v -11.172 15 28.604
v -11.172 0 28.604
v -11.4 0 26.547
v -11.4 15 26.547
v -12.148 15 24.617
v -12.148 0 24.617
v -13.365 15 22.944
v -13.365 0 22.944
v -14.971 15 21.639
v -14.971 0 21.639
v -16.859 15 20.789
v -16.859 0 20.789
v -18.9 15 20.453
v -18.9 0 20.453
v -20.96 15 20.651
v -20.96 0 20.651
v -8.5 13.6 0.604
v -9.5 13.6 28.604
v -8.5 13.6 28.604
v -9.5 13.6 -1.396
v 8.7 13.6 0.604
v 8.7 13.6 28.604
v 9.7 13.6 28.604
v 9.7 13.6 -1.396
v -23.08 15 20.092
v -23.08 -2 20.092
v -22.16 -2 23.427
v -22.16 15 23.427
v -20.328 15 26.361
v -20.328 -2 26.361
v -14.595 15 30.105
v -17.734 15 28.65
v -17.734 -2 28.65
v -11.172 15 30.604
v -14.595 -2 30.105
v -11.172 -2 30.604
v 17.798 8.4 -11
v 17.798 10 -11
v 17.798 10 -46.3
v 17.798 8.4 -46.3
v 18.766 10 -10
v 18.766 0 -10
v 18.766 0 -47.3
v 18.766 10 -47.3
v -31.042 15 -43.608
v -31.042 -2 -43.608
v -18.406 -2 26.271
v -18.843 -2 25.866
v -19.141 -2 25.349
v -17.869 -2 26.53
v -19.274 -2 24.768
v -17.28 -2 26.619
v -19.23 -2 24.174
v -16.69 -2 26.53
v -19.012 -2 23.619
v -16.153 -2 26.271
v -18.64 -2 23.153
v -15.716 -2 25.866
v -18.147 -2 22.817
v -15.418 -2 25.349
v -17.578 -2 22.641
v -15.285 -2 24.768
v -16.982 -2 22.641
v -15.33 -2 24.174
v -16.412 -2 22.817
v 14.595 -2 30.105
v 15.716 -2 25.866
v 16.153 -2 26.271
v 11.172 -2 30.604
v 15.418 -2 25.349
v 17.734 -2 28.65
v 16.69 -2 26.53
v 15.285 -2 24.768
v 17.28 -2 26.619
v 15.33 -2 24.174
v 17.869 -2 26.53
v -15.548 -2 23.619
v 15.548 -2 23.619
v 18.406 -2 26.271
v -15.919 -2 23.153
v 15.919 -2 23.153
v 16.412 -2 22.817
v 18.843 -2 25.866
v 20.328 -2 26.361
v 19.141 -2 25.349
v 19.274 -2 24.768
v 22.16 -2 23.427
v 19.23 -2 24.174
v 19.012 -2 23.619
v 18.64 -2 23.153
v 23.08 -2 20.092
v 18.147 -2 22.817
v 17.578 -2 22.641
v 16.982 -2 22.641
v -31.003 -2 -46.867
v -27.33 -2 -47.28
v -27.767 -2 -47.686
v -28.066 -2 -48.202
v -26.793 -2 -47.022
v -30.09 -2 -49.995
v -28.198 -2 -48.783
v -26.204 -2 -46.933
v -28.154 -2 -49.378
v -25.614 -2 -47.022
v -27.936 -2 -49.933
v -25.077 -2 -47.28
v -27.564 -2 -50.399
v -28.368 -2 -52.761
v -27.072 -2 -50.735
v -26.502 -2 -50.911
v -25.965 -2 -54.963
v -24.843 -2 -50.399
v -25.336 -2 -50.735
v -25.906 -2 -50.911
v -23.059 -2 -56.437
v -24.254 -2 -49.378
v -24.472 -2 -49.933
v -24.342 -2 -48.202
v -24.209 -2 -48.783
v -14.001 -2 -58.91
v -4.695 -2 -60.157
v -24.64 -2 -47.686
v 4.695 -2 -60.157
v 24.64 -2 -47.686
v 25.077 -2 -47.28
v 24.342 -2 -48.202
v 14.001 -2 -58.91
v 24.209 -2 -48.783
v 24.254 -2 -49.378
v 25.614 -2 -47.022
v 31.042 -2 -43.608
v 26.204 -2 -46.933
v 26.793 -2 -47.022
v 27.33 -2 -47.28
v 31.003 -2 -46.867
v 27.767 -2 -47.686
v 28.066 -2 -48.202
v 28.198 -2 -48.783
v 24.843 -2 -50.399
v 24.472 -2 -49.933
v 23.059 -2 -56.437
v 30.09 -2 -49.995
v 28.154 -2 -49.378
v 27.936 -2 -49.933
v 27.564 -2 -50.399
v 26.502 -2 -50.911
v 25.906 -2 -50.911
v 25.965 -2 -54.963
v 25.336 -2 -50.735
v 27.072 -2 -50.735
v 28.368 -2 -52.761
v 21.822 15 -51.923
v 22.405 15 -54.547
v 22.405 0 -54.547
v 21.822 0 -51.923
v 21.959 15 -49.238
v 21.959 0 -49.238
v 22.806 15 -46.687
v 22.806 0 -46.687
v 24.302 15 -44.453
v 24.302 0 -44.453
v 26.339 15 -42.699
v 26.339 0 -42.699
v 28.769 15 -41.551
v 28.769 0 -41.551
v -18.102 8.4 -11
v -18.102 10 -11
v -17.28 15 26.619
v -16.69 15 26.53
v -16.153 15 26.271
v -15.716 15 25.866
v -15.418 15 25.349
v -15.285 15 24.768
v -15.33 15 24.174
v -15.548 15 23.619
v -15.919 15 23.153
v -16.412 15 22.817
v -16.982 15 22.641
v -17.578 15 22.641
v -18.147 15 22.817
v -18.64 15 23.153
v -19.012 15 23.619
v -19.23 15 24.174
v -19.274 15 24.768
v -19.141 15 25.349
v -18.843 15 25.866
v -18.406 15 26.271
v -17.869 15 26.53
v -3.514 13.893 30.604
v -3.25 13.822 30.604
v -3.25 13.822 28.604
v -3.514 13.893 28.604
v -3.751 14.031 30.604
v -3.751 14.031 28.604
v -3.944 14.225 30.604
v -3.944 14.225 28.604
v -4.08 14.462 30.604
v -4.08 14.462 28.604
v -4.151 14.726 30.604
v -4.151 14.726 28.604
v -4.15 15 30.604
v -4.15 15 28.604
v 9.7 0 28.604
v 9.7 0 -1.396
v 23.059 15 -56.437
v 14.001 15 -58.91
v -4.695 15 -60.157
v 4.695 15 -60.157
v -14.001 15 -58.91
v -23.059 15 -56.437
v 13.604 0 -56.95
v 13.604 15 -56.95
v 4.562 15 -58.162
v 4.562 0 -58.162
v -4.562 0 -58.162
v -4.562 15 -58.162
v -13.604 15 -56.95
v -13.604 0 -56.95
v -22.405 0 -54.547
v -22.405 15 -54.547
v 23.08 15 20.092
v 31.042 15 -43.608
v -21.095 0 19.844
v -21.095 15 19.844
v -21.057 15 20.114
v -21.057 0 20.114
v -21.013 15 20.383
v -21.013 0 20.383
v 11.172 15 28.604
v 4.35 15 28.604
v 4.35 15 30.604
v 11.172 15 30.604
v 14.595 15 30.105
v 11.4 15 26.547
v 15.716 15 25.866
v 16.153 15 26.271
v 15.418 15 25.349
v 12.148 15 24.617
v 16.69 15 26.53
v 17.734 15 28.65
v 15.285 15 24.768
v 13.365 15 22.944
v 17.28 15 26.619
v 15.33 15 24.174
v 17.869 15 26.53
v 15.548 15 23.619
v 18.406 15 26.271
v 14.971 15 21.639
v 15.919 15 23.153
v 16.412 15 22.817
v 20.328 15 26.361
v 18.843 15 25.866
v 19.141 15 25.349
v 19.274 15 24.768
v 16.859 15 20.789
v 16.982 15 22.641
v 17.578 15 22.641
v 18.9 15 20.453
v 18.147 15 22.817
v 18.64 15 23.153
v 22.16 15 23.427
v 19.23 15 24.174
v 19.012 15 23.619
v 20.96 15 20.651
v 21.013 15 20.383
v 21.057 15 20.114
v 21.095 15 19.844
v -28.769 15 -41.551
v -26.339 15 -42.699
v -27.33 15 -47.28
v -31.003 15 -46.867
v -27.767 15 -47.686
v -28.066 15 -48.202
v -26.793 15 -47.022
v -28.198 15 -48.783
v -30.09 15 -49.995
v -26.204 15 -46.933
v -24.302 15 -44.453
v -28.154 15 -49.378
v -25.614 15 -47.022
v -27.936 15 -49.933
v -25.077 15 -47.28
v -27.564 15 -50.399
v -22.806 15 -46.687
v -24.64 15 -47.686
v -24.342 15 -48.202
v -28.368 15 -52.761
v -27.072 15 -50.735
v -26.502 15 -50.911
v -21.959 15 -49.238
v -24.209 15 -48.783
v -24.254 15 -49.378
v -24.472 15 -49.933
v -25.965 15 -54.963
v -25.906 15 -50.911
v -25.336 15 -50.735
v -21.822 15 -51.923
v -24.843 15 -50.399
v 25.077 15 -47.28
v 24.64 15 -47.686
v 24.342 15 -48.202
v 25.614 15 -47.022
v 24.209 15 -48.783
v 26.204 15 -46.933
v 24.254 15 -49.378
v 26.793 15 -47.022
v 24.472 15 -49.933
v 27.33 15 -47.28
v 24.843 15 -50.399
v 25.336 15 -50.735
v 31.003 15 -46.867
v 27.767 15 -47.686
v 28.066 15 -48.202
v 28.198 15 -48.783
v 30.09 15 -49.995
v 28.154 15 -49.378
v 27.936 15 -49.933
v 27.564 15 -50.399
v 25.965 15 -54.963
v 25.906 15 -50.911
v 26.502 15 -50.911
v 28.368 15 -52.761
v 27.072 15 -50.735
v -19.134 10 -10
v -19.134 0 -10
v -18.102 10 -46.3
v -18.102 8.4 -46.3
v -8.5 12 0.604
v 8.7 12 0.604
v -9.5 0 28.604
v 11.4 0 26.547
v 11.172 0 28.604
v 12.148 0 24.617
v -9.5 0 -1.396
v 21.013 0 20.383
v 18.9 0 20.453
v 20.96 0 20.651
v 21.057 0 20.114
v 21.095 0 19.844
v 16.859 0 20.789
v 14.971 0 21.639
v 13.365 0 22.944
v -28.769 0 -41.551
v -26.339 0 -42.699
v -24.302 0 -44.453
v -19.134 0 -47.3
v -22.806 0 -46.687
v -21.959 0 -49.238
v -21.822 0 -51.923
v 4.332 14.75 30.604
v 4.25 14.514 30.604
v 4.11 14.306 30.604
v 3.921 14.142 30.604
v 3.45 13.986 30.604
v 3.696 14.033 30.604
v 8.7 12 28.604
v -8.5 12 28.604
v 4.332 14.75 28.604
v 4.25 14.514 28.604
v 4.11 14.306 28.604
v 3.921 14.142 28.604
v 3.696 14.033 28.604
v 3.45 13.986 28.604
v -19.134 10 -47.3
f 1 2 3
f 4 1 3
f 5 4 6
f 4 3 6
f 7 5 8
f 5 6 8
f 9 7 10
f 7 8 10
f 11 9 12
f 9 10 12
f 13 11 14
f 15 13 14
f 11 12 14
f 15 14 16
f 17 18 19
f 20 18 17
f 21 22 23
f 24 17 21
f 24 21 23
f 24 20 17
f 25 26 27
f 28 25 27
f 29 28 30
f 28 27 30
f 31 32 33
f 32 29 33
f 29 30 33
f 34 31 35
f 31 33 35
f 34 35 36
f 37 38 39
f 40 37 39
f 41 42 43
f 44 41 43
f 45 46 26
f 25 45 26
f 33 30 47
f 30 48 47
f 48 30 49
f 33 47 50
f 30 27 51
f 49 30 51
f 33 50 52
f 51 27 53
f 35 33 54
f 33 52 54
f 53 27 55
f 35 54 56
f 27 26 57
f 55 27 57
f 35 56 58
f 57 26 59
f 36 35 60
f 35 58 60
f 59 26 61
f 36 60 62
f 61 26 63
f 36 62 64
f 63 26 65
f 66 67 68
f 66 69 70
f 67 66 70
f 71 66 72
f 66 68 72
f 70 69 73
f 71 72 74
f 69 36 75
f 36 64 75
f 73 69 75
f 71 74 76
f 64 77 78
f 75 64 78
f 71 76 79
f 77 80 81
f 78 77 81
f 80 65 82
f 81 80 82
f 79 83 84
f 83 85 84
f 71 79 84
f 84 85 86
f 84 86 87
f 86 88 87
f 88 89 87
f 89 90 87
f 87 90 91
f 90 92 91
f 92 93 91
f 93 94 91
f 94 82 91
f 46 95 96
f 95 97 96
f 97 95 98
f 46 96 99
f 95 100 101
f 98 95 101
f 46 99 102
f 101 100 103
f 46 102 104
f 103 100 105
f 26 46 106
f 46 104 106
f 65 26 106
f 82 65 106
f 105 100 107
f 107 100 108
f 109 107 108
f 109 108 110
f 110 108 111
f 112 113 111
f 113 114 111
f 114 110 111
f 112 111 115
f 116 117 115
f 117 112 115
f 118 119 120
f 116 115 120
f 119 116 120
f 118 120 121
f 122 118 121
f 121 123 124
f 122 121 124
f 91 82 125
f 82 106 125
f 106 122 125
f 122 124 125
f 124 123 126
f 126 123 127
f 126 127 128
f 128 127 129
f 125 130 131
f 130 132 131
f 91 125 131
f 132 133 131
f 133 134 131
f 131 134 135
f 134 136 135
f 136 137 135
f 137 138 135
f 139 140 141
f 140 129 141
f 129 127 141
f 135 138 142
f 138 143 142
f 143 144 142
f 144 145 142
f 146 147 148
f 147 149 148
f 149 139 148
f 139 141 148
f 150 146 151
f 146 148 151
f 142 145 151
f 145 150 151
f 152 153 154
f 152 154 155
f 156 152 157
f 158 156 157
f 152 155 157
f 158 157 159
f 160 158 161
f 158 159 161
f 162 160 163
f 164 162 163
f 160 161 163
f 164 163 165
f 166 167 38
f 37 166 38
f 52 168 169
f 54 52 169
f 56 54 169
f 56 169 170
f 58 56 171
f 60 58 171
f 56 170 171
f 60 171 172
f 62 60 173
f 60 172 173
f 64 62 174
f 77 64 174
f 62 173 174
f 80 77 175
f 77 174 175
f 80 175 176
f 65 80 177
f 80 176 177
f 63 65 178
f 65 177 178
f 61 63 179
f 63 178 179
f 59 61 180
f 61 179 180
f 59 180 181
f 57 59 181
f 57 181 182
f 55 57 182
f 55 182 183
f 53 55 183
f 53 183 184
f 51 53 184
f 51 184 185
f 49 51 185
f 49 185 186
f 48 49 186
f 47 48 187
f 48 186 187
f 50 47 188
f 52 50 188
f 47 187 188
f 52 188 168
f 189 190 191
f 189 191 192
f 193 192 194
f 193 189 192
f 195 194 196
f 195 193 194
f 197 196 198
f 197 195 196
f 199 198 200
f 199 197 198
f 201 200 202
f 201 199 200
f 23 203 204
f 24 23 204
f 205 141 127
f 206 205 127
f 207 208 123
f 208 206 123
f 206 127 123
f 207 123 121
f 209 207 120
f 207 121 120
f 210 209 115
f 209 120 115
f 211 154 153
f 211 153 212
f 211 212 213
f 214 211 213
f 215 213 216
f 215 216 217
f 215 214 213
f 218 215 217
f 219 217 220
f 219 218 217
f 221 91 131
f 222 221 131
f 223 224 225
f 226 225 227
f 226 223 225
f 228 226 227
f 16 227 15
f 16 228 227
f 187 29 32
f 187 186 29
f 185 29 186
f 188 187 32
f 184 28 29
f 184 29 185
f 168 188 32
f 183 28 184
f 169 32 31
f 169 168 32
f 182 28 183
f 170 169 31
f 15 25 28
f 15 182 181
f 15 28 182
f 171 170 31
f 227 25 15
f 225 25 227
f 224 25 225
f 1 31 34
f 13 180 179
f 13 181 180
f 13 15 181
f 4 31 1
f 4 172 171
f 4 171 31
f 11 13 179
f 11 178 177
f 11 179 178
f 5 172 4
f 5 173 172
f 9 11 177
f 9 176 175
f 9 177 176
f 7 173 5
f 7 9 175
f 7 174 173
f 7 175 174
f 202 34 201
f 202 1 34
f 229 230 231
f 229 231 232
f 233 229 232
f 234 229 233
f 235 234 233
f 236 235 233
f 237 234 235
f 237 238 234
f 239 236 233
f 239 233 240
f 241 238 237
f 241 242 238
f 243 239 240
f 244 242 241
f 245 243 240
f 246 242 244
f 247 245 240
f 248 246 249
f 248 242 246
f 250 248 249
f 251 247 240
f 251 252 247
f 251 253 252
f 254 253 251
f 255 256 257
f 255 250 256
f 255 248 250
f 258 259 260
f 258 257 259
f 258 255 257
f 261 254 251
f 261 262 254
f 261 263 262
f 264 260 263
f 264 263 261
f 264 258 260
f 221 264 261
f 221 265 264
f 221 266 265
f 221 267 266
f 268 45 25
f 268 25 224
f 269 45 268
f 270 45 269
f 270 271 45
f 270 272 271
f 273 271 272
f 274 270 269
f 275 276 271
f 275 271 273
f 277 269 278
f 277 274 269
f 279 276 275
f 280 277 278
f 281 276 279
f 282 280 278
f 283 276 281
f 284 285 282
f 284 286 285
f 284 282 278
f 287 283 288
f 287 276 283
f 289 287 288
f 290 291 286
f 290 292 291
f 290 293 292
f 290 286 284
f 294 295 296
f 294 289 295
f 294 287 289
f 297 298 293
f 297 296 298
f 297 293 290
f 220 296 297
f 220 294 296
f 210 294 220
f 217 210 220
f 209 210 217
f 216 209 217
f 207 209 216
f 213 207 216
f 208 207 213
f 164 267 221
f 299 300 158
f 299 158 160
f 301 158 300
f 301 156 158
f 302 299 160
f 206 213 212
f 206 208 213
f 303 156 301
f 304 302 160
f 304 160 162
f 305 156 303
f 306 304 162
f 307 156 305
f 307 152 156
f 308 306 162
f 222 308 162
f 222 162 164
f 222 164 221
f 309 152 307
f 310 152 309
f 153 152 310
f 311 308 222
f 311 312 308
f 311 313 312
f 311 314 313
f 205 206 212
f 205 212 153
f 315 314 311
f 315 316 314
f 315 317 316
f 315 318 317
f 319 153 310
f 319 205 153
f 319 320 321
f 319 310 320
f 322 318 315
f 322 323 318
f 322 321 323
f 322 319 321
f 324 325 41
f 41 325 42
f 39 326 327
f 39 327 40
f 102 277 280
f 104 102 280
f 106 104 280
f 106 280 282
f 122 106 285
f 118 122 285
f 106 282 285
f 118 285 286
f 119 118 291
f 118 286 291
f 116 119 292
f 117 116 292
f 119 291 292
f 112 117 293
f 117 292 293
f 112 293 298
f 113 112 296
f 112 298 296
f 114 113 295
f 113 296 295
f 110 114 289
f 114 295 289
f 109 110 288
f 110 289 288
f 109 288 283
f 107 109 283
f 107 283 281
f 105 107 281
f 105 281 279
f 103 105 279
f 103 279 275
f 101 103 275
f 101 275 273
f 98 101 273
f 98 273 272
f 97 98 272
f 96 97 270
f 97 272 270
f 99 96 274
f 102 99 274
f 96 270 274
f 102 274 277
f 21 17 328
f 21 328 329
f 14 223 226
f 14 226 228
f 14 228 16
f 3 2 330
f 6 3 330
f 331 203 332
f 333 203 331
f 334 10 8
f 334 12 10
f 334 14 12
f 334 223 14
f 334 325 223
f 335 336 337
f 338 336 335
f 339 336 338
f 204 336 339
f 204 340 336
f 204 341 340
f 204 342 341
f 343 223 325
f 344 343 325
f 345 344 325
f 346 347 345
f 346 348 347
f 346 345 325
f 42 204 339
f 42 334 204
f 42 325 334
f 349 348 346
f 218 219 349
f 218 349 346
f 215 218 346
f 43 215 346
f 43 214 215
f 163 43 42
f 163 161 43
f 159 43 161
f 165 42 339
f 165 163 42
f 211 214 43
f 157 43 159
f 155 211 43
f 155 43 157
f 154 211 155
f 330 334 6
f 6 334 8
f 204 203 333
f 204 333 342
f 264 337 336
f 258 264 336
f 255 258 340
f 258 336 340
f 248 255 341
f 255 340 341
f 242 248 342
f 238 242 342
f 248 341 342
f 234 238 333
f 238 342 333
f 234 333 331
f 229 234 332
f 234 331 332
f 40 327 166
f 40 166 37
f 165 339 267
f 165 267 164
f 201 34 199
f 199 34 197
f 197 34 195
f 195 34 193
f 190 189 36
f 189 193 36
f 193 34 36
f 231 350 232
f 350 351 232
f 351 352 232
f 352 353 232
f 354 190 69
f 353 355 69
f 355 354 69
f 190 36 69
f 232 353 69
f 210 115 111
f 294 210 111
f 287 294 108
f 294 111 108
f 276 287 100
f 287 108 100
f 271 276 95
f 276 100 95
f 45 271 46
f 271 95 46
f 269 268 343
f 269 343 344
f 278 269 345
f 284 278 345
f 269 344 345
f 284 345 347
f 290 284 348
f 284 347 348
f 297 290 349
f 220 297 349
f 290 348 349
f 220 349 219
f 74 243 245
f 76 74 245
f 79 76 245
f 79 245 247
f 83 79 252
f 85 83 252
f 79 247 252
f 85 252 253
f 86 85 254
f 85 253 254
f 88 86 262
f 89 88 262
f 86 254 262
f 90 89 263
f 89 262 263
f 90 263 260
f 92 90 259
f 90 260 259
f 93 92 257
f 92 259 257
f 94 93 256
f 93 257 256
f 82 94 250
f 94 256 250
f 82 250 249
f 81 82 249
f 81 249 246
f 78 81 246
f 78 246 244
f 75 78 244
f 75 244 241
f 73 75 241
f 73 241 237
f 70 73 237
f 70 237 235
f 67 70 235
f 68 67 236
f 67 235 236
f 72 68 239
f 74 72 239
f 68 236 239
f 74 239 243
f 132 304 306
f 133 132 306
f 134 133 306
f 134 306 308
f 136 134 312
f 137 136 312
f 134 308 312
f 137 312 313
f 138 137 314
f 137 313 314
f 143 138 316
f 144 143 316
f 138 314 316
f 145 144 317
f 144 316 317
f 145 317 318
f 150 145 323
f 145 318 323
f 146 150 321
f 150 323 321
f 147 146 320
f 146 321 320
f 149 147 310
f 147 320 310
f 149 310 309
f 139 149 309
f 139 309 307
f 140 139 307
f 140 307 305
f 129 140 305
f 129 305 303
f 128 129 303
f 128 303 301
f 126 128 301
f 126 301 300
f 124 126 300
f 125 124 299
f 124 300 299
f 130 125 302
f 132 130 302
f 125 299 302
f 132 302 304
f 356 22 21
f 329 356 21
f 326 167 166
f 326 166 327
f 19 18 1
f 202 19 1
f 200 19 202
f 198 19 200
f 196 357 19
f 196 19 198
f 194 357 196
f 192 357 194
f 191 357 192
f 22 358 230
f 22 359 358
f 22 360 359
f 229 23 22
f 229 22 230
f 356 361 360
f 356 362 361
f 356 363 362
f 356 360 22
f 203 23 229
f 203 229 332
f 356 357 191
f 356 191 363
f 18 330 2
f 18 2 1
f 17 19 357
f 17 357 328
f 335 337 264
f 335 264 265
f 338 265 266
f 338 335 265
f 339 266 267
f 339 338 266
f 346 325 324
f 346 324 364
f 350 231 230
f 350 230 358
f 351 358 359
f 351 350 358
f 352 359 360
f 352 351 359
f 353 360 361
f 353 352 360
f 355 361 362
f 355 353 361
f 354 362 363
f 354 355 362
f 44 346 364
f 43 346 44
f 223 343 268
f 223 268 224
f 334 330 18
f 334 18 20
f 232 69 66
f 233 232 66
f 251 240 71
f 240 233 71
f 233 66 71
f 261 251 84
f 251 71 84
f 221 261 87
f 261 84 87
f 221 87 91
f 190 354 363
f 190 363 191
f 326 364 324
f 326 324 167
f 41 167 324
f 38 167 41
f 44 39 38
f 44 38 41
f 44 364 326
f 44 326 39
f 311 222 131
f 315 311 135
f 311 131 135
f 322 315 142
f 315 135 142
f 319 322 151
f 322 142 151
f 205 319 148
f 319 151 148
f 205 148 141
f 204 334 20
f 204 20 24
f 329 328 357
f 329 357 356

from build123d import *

# Parameters (mm, degrees)
BOSS_EXTRUDE1_DEPTH = 15
SHELL1_T            = 2
BOSS_EXTRUDE2_DEPTH = 15
SKETCH4_R           = 2
CUT_EXTRUDE3_DEPTH  = 17
SKETCH5_W           = 37.9
SKETCH5_H           = 37.3
BOSS_EXTRUDE3_DEPTH = 10
SKETCH8_W           = 35.9
SKETCH8_H           = 35.3
CUT_EXTRUDE4_DEPTH  = 1.6
SKETCH9_W           = 19.2
SKETCH9_H           = 30
BOSS_EXTRUDE5_DEPTH = 13.6
SKETCH11_W          = 17.2
SKETCH11_H          = 28
CUT_EXTRUDE7_DEPTH  = 1.6
CUT_EXTRUDE8_DEPTH  = 2


# Read off the part's stored shape, not the designer's step: Boss-Extrude2
with BuildPart() as part:
    # Sketch2 → Boss-Extrude1 (new body)
    with BuildSketch(Plane(origin=(0, 0, 0), x_dir=(1, 0, 0), z_dir=(0, 1, 0))):
        with BuildLine():
            Line((-29.057488174, 43.856363161), (-21.094956582, -19.84388958))
            ThreePointArc((-21.094956582, -19.84388958), (-17.790203447, -26.100323992), (-11.172177815, -28.603542234))
            Line((-11.172177815, -28.603542234), (11.172177815, -28.603542234))
            ThreePointArc((11.172177815, -28.603542234), (17.790203447, -26.100323992), (21.094956582, -19.84388958))
            Line((21.094956582, -19.84388958), (29.057488174, 43.856363161))
            ThreePointArc((29.057488174, 43.856363161), (27.625040268, 50.380107319), (22.404958564, 54.546867672))
            ThreePointArc((22.404958564, 54.546867672), (0, 58.313921904), (-22.404958564, 54.546867672))
            ThreePointArc((-22.404958564, 54.546867672), (-27.625040268, 50.380107319), (-29.057488174, 43.856363161))
        make_face()
    extrude(amount=BOSS_EXTRUDE1_DEPTH)

    # Shell1
    shell1_openings = [part.faces().sort_by_distance(p)[0] for p in [
        (0, 15, -16.825507136),
    ]]
    offset(amount=SHELL1_T, openings=shell1_openings, kind=Kind.INTERSECTION)

    # Boss-Extrude2 outline → Boss-Extrude2 (add)
    with BuildSketch(Plane(origin=(0, 0, 0), x_dir=(1, 0, 0), z_dir=(0, 1, 0))):
        with BuildLine():
            ThreePointArc((11.172177815, -28.603542234), (17.478052637, -26.364724021), (20.960385979, -20.65073078))
            ThreePointArc((20.960385979, -20.65073078), (14.125965093, -22.239021953), (11.172177815, -28.603542234))
        make_face()
        with BuildLine():
            ThreePointArc((22.404958564, 54.546867672), (22.805580573, 46.686663567), (28.769287815, 41.550760286))
            Line((28.769287815, 41.550760286), (29.057488174, 43.856363161))
            ThreePointArc((29.057488174, 43.856363161), (27.625040268, 50.380107319), (22.404958564, 54.546867672))
        make_face()
        with BuildLine():
            ThreePointArc((-11.172177815, -28.603542234), (-14.125965093, -22.239021953), (-20.960385978, -20.65073078))
            ThreePointArc((-20.960385978, -20.65073078), (-17.478052637, -26.364724021), (-11.172177815, -28.603542234))
        make_face()
        with BuildLine():
            Line((-29.057488174, 43.856363161), (-28.769287815, 41.550760286))
            ThreePointArc((-28.769287815, 41.550760286), (-22.805580573, 46.686663567), (-22.404958564, 54.546867672))
            ThreePointArc((-22.404958564, 54.546867672), (-27.625040268, 50.380107319), (-29.057488174, 43.856363161))
        make_face()
    extrude(amount=BOSS_EXTRUDE2_DEPTH)

    # Sketch4 → Cut-Extrude3 (cut)
    with BuildSketch(Plane(origin=(0, 15, 0), x_dir=(1, 0, 0), z_dir=(0, 1, 0))):
        with Locations(Location((-26.203765036, 48.932847943, 0), (0, 0, 270))):
            Circle(SKETCH4_R)
        with Locations(Location((-17.279655559, -24.618760567, 0), (0, 0, 270))):
            Circle(SKETCH4_R)
        with Locations(Location((17.279655559, -24.618760567, 0), (0, 0, 270))):
            Circle(SKETCH4_R)
        with Locations(Location((26.203765036, 48.932847943, 0), (0, 0, 270))):
            Circle(SKETCH4_R)
    extrude(amount=-CUT_EXTRUDE3_DEPTH, mode=Mode.SUBTRACT)

    # Sketch5 → Boss-Extrude3 (add)
    with BuildSketch(Plane(origin=(-2.134010057, 0, 0), x_dir=(1, 0, 0), z_dir=(0, 1, 0))):
        with Locations((1.95, 28.65)):
            Rectangle(SKETCH5_W, SKETCH5_H)
    extrude(amount=BOSS_EXTRUDE3_DEPTH)

    # Sketch8 → Cut-Extrude4 (cut)
    with BuildSketch(Plane(origin=(48.898344446, 10, 0), x_dir=(1, 0, 0), z_dir=(0, 1, 0))):
        with Locations((-49.05, 28.65)):
            Rectangle(SKETCH8_W, SKETCH8_H)
    extrude(amount=-CUT_EXTRUDE4_DEPTH, mode=Mode.SUBTRACT)

    # Sketch9 → Boss-Extrude5 (add)
    with BuildSketch(Plane(origin=(0, 0, 0), x_dir=(1, 0, 0), z_dir=(0, 1, 0))):
        with Locations((0.1, -13.603542234)):
            Rectangle(SKETCH9_W, SKETCH9_H)
    extrude(amount=BOSS_EXTRUDE5_DEPTH)

    # Sketch11 → Cut-Extrude7 (cut)
    with BuildSketch(Plane(origin=(0, 13.6, 0), x_dir=(1, 0, 0), z_dir=(0, 1, 0))):
        with Locations((0.1, -14.603542234)):
            Rectangle(SKETCH11_W, SKETCH11_H)
    extrude(amount=-CUT_EXTRUDE7_DEPTH, mode=Mode.SUBTRACT)

    # Sketch12 → Cut-Extrude8 (cut)
    with BuildSketch(Plane.XY.offset(30.603542234)):
        with BuildLine():
            Line((-4.15, 15), (4.35, 15))
            ThreePointArc((4.35, 15), (4.110077828, 14.306431155), (3.45, 13.985654515))
            Line((3.45, 13.985654515), (-3.25, 13.821910042))
            ThreePointArc((-3.25, 13.821910042), (-3.943990419, 14.224558918), (-4.15, 15))
        make_face()
    extrude(amount=-CUT_EXTRUDE8_DEPTH, mode=Mode.SUBTRACT)


solid = part.part
